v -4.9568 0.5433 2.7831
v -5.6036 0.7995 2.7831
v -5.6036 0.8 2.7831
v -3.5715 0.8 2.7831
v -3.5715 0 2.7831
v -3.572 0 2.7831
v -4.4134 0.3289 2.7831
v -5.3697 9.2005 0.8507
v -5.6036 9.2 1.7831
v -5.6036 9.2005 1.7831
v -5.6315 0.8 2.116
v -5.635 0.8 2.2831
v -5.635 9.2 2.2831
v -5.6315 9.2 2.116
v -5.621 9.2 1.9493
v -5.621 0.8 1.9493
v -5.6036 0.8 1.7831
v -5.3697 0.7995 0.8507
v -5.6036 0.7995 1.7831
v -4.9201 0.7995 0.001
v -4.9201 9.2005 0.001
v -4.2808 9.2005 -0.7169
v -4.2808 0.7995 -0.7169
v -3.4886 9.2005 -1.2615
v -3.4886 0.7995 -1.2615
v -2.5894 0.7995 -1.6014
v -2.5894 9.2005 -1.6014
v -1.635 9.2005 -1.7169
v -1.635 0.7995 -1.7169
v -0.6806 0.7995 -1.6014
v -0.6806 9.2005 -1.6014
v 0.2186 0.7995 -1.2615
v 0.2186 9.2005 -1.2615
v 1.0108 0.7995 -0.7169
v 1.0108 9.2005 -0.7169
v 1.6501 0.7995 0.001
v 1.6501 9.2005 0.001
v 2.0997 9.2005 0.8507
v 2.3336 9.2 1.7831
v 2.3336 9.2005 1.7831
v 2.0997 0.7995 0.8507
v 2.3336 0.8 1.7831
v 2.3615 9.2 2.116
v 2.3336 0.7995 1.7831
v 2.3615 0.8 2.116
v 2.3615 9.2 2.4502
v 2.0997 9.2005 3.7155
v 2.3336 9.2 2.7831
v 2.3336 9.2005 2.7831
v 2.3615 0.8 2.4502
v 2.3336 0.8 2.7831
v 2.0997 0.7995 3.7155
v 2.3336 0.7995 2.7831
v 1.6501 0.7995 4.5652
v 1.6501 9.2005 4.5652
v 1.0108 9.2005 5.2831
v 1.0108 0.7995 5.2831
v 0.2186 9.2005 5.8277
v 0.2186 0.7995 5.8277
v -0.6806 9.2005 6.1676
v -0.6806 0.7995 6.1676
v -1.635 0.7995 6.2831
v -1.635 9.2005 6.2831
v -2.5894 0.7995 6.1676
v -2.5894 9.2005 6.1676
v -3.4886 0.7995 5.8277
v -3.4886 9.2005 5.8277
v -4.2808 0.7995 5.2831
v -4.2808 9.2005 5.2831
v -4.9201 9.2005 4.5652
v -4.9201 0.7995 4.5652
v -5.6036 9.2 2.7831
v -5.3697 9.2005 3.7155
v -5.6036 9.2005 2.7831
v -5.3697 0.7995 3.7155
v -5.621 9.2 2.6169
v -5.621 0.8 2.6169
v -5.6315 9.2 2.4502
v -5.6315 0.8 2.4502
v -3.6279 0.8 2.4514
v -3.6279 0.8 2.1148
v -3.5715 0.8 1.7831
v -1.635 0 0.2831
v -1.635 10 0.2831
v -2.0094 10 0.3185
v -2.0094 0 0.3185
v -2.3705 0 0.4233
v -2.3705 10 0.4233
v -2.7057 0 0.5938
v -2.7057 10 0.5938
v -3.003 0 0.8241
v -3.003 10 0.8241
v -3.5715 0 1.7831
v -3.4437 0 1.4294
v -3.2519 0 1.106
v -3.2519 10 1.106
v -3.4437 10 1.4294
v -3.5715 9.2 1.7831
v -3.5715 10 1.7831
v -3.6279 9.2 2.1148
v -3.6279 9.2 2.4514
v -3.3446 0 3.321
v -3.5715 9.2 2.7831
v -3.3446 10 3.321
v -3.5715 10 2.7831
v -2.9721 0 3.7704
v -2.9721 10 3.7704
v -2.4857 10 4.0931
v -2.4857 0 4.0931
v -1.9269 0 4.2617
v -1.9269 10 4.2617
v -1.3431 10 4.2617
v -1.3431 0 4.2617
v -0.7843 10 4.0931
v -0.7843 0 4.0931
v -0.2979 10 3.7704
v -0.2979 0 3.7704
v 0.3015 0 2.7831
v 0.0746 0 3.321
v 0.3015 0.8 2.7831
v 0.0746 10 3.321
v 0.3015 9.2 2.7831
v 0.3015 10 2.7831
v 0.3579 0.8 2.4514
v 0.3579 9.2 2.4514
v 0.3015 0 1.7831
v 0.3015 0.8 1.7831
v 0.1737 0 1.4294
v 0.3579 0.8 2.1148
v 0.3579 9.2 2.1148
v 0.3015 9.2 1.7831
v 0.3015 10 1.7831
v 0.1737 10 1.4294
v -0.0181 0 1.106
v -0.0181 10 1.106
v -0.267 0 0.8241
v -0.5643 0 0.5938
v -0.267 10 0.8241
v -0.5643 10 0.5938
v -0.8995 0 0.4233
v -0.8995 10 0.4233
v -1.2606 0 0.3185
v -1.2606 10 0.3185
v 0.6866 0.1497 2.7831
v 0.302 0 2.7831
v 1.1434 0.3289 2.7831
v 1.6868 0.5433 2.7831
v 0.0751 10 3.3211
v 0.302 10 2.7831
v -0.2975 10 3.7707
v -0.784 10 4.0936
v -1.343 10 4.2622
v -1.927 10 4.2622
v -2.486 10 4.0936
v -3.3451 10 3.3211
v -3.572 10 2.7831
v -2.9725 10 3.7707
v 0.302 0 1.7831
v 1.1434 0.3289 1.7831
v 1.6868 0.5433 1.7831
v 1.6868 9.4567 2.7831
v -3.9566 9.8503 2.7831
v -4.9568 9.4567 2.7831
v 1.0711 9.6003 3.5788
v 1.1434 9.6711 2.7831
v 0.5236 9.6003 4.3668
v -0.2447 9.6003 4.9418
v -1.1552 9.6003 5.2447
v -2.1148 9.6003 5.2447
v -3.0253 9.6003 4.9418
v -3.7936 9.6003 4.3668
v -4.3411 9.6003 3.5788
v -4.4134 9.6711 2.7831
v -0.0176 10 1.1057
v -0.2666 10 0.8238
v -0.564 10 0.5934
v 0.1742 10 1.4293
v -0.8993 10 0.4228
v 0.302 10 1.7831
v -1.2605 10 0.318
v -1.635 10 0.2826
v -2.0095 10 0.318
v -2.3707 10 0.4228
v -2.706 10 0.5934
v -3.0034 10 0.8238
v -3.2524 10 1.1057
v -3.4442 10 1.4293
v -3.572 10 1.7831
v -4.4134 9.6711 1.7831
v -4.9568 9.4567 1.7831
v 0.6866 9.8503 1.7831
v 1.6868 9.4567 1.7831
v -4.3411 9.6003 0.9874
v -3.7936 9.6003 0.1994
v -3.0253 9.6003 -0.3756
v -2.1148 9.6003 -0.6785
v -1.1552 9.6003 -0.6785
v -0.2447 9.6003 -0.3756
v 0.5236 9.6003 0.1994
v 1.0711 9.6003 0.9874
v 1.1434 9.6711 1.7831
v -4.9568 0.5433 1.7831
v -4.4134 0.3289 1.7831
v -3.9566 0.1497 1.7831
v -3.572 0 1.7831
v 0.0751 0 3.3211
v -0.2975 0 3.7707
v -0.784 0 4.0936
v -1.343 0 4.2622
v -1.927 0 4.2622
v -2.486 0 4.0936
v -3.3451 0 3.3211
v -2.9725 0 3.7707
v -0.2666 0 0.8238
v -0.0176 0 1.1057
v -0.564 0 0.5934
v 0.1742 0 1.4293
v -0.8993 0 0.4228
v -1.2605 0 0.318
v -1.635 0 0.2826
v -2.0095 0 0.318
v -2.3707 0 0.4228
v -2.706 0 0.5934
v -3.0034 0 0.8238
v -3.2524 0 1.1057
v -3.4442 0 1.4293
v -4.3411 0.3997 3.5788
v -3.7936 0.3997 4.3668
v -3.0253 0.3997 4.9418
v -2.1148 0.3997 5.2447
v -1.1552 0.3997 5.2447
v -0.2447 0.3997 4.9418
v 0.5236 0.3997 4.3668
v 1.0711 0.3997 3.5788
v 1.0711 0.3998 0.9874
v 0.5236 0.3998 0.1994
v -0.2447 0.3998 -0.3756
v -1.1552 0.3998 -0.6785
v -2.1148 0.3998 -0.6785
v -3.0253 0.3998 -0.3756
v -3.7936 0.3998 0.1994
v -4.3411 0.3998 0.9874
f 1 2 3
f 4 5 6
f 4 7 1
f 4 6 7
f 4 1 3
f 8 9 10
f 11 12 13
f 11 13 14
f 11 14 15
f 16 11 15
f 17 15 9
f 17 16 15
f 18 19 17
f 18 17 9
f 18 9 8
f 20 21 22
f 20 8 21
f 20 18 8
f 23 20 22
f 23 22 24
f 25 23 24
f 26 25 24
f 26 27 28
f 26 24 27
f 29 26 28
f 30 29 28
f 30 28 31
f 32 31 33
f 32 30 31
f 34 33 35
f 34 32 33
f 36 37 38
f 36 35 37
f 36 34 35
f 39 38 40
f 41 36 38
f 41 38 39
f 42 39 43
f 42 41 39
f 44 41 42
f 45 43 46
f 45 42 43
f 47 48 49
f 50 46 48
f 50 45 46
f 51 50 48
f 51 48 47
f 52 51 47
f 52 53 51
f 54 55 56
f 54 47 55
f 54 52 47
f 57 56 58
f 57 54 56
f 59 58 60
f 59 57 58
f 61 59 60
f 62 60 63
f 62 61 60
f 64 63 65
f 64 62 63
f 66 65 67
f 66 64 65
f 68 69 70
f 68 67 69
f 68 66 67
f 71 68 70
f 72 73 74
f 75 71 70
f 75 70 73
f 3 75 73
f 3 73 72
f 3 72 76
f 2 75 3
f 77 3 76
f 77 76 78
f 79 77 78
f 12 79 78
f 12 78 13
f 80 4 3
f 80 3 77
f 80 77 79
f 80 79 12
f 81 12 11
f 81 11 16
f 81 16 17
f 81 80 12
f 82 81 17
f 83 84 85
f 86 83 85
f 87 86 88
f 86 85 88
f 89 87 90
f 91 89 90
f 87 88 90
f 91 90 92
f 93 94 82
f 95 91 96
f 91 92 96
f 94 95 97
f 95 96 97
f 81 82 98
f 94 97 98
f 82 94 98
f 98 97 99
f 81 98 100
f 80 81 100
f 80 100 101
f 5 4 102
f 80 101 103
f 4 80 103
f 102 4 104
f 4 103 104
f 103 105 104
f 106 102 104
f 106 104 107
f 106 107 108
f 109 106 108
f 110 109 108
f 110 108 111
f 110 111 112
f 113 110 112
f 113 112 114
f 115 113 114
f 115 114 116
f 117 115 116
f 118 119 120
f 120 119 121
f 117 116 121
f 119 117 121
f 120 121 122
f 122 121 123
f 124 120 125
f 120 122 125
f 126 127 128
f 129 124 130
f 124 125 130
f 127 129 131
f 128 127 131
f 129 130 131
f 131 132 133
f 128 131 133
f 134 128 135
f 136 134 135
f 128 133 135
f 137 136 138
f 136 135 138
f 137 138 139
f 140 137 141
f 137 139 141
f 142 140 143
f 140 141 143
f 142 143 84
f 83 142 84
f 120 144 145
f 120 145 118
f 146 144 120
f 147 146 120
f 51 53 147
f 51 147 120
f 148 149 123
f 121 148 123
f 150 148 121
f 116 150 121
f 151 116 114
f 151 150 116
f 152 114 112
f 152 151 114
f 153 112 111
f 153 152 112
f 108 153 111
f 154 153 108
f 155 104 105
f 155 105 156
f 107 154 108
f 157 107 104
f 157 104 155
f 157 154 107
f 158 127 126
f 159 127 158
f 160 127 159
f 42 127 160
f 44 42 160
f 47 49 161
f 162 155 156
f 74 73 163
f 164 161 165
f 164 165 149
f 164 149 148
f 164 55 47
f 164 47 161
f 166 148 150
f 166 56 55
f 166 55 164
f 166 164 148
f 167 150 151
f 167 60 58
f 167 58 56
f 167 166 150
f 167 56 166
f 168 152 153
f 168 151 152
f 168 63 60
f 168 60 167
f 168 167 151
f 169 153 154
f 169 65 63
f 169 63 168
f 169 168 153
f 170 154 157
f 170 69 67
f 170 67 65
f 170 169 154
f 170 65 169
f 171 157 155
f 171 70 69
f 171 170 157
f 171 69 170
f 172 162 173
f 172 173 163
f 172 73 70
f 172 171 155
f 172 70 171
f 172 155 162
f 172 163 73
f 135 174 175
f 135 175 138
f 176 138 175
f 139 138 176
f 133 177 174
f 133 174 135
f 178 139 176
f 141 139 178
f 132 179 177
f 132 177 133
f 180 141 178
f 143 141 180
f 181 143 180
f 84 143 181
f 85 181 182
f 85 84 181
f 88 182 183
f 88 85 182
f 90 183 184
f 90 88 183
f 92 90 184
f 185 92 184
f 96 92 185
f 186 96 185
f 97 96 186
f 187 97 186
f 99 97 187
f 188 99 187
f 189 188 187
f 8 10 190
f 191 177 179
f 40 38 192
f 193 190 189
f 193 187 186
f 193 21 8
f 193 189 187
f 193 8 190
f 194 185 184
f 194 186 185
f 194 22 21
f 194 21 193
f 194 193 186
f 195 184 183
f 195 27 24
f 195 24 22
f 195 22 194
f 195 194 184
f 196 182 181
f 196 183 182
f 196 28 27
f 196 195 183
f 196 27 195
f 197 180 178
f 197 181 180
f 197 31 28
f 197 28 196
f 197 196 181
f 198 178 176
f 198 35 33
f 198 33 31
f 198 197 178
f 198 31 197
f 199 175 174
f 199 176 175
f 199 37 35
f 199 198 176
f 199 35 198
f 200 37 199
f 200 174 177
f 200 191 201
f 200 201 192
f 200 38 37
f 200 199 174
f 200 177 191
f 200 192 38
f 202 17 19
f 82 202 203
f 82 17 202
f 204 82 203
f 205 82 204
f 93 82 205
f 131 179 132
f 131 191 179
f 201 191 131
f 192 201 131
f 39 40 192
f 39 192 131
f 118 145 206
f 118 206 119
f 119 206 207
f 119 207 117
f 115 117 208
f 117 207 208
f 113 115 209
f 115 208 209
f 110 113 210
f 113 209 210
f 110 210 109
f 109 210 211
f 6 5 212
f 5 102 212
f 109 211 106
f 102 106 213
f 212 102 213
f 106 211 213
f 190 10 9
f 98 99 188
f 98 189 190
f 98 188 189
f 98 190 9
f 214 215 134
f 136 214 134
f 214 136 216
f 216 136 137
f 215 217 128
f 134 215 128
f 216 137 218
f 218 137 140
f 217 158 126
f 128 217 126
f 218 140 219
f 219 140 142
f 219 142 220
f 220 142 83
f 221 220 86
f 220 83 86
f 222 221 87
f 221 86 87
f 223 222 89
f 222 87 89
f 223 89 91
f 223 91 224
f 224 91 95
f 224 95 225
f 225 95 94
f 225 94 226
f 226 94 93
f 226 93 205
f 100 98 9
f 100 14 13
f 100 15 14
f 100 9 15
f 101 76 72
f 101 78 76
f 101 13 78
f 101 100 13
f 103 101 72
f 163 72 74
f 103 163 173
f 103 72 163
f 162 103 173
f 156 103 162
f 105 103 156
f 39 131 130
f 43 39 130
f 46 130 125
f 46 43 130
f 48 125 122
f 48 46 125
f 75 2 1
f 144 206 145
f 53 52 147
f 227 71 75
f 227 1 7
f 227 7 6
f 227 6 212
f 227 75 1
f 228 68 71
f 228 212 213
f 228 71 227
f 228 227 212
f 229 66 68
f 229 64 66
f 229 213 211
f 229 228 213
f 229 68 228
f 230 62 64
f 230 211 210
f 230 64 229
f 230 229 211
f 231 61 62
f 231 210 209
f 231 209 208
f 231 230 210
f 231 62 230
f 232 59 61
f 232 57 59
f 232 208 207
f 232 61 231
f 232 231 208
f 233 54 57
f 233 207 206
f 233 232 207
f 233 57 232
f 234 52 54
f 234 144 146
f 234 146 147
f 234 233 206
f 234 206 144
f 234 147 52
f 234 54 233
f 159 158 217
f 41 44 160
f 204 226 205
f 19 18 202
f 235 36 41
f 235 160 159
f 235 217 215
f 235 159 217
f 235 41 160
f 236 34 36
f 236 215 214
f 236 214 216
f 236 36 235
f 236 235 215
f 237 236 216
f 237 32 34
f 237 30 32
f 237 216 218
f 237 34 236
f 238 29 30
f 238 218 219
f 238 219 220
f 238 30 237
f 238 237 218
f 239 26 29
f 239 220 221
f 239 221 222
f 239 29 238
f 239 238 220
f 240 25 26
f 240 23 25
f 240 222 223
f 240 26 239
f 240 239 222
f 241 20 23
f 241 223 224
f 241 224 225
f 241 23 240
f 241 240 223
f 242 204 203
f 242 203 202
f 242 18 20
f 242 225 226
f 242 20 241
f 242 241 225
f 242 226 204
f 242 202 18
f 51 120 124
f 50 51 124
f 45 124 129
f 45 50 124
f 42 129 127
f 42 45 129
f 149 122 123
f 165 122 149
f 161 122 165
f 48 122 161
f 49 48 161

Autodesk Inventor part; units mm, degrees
ref_plane "XZ Plane" through (0, 0, 0) normal (0, 1, 0) x (-1, 0, 0)
ref_plane "XY Plane" through (0, 0, 0) normal (0, 0, 1) x (1, 0, 0)
sketch "Schizzo1" plane through (0, 0, 0) normal (0, 1, 0) x (-1, 0, 0)
  circle A0 centre (1.635, 2.2831) radius 4
  dimension "d2" = 8
extrude "Estrusione1" add sketch "Schizzo1" along normal blind 10
thread "Filettatura1" size "M8x1.25" class "6g" standard "ISO Metric profile" full length
sketch "Schizzo2" plane through (-1.635, 0, 2.2831) normal (0, -1, 0) x (1, 0, 0)
  point P0 (1.635, -2.2831)
  point P1 (0, 0)
hole "Foro1" at (-1.635, 0, 2.2831) direction (0, 1, 0) diameter 4 end through all
thread "Filettatura2" size "M4x0.7" class "6H" standard "ANSI Metric M Profile" full length
chamfer "Smusso1" distance 0.8 distance2 2 2 edges at (2.365, 0, 2.2831) (2.365, 10, 2.2831) measured on face at (-5.5832, 6.6667, 1.6415)
ref_plane "Piano di lavoro1" through (2.365, 0, 2.2831) normal (1, 0, 0) x (0, 1, 0)
sketch "Schizzo3" plane through (2.365, 0, 2.2831) normal (1, 0, 0) x (0, 1, 0)
  line L0 (10, 2) -> (10, -2) projected
  line L1 (0, -2) -> (0, 2) projected
  line L2 (9.2, -4) -> (9.2, 4) projected
  line L3 (0.8, 4) -> (0.8, -4) projected
  line L4 (10, -0.5) -> (9.2, -0.5)
  line L5 (9.2, -0.5) -> (9.2, 0.5)
  line L6 (9.2, 0.5) -> (10, 0.5)
  line L7 (10, 0.5) -> (10, -0.5)
  line L8 (0, 0) -> (10, 0)
  line L9 (0.8, -0.5) -> (0, -0.5)
  line L10 (0, -0.5) -> (0, 0.5)
  line L11 (0, 0.5) -> (0.8, 0.5)
  line L12 (0.8, 0.5) -> (0.8, -0.5)
  point P0 (0, -2.2831)
  point P1 (0.8, 0.5)
  point P2 (0, -0.5)
  dimension "d19" = 1
extrude "Estrusione2" cut sketch "Schizzo3" along normal through all both and the other way through all
properties part number "M8x1.25-M4x0.7 Thread Reductor"
